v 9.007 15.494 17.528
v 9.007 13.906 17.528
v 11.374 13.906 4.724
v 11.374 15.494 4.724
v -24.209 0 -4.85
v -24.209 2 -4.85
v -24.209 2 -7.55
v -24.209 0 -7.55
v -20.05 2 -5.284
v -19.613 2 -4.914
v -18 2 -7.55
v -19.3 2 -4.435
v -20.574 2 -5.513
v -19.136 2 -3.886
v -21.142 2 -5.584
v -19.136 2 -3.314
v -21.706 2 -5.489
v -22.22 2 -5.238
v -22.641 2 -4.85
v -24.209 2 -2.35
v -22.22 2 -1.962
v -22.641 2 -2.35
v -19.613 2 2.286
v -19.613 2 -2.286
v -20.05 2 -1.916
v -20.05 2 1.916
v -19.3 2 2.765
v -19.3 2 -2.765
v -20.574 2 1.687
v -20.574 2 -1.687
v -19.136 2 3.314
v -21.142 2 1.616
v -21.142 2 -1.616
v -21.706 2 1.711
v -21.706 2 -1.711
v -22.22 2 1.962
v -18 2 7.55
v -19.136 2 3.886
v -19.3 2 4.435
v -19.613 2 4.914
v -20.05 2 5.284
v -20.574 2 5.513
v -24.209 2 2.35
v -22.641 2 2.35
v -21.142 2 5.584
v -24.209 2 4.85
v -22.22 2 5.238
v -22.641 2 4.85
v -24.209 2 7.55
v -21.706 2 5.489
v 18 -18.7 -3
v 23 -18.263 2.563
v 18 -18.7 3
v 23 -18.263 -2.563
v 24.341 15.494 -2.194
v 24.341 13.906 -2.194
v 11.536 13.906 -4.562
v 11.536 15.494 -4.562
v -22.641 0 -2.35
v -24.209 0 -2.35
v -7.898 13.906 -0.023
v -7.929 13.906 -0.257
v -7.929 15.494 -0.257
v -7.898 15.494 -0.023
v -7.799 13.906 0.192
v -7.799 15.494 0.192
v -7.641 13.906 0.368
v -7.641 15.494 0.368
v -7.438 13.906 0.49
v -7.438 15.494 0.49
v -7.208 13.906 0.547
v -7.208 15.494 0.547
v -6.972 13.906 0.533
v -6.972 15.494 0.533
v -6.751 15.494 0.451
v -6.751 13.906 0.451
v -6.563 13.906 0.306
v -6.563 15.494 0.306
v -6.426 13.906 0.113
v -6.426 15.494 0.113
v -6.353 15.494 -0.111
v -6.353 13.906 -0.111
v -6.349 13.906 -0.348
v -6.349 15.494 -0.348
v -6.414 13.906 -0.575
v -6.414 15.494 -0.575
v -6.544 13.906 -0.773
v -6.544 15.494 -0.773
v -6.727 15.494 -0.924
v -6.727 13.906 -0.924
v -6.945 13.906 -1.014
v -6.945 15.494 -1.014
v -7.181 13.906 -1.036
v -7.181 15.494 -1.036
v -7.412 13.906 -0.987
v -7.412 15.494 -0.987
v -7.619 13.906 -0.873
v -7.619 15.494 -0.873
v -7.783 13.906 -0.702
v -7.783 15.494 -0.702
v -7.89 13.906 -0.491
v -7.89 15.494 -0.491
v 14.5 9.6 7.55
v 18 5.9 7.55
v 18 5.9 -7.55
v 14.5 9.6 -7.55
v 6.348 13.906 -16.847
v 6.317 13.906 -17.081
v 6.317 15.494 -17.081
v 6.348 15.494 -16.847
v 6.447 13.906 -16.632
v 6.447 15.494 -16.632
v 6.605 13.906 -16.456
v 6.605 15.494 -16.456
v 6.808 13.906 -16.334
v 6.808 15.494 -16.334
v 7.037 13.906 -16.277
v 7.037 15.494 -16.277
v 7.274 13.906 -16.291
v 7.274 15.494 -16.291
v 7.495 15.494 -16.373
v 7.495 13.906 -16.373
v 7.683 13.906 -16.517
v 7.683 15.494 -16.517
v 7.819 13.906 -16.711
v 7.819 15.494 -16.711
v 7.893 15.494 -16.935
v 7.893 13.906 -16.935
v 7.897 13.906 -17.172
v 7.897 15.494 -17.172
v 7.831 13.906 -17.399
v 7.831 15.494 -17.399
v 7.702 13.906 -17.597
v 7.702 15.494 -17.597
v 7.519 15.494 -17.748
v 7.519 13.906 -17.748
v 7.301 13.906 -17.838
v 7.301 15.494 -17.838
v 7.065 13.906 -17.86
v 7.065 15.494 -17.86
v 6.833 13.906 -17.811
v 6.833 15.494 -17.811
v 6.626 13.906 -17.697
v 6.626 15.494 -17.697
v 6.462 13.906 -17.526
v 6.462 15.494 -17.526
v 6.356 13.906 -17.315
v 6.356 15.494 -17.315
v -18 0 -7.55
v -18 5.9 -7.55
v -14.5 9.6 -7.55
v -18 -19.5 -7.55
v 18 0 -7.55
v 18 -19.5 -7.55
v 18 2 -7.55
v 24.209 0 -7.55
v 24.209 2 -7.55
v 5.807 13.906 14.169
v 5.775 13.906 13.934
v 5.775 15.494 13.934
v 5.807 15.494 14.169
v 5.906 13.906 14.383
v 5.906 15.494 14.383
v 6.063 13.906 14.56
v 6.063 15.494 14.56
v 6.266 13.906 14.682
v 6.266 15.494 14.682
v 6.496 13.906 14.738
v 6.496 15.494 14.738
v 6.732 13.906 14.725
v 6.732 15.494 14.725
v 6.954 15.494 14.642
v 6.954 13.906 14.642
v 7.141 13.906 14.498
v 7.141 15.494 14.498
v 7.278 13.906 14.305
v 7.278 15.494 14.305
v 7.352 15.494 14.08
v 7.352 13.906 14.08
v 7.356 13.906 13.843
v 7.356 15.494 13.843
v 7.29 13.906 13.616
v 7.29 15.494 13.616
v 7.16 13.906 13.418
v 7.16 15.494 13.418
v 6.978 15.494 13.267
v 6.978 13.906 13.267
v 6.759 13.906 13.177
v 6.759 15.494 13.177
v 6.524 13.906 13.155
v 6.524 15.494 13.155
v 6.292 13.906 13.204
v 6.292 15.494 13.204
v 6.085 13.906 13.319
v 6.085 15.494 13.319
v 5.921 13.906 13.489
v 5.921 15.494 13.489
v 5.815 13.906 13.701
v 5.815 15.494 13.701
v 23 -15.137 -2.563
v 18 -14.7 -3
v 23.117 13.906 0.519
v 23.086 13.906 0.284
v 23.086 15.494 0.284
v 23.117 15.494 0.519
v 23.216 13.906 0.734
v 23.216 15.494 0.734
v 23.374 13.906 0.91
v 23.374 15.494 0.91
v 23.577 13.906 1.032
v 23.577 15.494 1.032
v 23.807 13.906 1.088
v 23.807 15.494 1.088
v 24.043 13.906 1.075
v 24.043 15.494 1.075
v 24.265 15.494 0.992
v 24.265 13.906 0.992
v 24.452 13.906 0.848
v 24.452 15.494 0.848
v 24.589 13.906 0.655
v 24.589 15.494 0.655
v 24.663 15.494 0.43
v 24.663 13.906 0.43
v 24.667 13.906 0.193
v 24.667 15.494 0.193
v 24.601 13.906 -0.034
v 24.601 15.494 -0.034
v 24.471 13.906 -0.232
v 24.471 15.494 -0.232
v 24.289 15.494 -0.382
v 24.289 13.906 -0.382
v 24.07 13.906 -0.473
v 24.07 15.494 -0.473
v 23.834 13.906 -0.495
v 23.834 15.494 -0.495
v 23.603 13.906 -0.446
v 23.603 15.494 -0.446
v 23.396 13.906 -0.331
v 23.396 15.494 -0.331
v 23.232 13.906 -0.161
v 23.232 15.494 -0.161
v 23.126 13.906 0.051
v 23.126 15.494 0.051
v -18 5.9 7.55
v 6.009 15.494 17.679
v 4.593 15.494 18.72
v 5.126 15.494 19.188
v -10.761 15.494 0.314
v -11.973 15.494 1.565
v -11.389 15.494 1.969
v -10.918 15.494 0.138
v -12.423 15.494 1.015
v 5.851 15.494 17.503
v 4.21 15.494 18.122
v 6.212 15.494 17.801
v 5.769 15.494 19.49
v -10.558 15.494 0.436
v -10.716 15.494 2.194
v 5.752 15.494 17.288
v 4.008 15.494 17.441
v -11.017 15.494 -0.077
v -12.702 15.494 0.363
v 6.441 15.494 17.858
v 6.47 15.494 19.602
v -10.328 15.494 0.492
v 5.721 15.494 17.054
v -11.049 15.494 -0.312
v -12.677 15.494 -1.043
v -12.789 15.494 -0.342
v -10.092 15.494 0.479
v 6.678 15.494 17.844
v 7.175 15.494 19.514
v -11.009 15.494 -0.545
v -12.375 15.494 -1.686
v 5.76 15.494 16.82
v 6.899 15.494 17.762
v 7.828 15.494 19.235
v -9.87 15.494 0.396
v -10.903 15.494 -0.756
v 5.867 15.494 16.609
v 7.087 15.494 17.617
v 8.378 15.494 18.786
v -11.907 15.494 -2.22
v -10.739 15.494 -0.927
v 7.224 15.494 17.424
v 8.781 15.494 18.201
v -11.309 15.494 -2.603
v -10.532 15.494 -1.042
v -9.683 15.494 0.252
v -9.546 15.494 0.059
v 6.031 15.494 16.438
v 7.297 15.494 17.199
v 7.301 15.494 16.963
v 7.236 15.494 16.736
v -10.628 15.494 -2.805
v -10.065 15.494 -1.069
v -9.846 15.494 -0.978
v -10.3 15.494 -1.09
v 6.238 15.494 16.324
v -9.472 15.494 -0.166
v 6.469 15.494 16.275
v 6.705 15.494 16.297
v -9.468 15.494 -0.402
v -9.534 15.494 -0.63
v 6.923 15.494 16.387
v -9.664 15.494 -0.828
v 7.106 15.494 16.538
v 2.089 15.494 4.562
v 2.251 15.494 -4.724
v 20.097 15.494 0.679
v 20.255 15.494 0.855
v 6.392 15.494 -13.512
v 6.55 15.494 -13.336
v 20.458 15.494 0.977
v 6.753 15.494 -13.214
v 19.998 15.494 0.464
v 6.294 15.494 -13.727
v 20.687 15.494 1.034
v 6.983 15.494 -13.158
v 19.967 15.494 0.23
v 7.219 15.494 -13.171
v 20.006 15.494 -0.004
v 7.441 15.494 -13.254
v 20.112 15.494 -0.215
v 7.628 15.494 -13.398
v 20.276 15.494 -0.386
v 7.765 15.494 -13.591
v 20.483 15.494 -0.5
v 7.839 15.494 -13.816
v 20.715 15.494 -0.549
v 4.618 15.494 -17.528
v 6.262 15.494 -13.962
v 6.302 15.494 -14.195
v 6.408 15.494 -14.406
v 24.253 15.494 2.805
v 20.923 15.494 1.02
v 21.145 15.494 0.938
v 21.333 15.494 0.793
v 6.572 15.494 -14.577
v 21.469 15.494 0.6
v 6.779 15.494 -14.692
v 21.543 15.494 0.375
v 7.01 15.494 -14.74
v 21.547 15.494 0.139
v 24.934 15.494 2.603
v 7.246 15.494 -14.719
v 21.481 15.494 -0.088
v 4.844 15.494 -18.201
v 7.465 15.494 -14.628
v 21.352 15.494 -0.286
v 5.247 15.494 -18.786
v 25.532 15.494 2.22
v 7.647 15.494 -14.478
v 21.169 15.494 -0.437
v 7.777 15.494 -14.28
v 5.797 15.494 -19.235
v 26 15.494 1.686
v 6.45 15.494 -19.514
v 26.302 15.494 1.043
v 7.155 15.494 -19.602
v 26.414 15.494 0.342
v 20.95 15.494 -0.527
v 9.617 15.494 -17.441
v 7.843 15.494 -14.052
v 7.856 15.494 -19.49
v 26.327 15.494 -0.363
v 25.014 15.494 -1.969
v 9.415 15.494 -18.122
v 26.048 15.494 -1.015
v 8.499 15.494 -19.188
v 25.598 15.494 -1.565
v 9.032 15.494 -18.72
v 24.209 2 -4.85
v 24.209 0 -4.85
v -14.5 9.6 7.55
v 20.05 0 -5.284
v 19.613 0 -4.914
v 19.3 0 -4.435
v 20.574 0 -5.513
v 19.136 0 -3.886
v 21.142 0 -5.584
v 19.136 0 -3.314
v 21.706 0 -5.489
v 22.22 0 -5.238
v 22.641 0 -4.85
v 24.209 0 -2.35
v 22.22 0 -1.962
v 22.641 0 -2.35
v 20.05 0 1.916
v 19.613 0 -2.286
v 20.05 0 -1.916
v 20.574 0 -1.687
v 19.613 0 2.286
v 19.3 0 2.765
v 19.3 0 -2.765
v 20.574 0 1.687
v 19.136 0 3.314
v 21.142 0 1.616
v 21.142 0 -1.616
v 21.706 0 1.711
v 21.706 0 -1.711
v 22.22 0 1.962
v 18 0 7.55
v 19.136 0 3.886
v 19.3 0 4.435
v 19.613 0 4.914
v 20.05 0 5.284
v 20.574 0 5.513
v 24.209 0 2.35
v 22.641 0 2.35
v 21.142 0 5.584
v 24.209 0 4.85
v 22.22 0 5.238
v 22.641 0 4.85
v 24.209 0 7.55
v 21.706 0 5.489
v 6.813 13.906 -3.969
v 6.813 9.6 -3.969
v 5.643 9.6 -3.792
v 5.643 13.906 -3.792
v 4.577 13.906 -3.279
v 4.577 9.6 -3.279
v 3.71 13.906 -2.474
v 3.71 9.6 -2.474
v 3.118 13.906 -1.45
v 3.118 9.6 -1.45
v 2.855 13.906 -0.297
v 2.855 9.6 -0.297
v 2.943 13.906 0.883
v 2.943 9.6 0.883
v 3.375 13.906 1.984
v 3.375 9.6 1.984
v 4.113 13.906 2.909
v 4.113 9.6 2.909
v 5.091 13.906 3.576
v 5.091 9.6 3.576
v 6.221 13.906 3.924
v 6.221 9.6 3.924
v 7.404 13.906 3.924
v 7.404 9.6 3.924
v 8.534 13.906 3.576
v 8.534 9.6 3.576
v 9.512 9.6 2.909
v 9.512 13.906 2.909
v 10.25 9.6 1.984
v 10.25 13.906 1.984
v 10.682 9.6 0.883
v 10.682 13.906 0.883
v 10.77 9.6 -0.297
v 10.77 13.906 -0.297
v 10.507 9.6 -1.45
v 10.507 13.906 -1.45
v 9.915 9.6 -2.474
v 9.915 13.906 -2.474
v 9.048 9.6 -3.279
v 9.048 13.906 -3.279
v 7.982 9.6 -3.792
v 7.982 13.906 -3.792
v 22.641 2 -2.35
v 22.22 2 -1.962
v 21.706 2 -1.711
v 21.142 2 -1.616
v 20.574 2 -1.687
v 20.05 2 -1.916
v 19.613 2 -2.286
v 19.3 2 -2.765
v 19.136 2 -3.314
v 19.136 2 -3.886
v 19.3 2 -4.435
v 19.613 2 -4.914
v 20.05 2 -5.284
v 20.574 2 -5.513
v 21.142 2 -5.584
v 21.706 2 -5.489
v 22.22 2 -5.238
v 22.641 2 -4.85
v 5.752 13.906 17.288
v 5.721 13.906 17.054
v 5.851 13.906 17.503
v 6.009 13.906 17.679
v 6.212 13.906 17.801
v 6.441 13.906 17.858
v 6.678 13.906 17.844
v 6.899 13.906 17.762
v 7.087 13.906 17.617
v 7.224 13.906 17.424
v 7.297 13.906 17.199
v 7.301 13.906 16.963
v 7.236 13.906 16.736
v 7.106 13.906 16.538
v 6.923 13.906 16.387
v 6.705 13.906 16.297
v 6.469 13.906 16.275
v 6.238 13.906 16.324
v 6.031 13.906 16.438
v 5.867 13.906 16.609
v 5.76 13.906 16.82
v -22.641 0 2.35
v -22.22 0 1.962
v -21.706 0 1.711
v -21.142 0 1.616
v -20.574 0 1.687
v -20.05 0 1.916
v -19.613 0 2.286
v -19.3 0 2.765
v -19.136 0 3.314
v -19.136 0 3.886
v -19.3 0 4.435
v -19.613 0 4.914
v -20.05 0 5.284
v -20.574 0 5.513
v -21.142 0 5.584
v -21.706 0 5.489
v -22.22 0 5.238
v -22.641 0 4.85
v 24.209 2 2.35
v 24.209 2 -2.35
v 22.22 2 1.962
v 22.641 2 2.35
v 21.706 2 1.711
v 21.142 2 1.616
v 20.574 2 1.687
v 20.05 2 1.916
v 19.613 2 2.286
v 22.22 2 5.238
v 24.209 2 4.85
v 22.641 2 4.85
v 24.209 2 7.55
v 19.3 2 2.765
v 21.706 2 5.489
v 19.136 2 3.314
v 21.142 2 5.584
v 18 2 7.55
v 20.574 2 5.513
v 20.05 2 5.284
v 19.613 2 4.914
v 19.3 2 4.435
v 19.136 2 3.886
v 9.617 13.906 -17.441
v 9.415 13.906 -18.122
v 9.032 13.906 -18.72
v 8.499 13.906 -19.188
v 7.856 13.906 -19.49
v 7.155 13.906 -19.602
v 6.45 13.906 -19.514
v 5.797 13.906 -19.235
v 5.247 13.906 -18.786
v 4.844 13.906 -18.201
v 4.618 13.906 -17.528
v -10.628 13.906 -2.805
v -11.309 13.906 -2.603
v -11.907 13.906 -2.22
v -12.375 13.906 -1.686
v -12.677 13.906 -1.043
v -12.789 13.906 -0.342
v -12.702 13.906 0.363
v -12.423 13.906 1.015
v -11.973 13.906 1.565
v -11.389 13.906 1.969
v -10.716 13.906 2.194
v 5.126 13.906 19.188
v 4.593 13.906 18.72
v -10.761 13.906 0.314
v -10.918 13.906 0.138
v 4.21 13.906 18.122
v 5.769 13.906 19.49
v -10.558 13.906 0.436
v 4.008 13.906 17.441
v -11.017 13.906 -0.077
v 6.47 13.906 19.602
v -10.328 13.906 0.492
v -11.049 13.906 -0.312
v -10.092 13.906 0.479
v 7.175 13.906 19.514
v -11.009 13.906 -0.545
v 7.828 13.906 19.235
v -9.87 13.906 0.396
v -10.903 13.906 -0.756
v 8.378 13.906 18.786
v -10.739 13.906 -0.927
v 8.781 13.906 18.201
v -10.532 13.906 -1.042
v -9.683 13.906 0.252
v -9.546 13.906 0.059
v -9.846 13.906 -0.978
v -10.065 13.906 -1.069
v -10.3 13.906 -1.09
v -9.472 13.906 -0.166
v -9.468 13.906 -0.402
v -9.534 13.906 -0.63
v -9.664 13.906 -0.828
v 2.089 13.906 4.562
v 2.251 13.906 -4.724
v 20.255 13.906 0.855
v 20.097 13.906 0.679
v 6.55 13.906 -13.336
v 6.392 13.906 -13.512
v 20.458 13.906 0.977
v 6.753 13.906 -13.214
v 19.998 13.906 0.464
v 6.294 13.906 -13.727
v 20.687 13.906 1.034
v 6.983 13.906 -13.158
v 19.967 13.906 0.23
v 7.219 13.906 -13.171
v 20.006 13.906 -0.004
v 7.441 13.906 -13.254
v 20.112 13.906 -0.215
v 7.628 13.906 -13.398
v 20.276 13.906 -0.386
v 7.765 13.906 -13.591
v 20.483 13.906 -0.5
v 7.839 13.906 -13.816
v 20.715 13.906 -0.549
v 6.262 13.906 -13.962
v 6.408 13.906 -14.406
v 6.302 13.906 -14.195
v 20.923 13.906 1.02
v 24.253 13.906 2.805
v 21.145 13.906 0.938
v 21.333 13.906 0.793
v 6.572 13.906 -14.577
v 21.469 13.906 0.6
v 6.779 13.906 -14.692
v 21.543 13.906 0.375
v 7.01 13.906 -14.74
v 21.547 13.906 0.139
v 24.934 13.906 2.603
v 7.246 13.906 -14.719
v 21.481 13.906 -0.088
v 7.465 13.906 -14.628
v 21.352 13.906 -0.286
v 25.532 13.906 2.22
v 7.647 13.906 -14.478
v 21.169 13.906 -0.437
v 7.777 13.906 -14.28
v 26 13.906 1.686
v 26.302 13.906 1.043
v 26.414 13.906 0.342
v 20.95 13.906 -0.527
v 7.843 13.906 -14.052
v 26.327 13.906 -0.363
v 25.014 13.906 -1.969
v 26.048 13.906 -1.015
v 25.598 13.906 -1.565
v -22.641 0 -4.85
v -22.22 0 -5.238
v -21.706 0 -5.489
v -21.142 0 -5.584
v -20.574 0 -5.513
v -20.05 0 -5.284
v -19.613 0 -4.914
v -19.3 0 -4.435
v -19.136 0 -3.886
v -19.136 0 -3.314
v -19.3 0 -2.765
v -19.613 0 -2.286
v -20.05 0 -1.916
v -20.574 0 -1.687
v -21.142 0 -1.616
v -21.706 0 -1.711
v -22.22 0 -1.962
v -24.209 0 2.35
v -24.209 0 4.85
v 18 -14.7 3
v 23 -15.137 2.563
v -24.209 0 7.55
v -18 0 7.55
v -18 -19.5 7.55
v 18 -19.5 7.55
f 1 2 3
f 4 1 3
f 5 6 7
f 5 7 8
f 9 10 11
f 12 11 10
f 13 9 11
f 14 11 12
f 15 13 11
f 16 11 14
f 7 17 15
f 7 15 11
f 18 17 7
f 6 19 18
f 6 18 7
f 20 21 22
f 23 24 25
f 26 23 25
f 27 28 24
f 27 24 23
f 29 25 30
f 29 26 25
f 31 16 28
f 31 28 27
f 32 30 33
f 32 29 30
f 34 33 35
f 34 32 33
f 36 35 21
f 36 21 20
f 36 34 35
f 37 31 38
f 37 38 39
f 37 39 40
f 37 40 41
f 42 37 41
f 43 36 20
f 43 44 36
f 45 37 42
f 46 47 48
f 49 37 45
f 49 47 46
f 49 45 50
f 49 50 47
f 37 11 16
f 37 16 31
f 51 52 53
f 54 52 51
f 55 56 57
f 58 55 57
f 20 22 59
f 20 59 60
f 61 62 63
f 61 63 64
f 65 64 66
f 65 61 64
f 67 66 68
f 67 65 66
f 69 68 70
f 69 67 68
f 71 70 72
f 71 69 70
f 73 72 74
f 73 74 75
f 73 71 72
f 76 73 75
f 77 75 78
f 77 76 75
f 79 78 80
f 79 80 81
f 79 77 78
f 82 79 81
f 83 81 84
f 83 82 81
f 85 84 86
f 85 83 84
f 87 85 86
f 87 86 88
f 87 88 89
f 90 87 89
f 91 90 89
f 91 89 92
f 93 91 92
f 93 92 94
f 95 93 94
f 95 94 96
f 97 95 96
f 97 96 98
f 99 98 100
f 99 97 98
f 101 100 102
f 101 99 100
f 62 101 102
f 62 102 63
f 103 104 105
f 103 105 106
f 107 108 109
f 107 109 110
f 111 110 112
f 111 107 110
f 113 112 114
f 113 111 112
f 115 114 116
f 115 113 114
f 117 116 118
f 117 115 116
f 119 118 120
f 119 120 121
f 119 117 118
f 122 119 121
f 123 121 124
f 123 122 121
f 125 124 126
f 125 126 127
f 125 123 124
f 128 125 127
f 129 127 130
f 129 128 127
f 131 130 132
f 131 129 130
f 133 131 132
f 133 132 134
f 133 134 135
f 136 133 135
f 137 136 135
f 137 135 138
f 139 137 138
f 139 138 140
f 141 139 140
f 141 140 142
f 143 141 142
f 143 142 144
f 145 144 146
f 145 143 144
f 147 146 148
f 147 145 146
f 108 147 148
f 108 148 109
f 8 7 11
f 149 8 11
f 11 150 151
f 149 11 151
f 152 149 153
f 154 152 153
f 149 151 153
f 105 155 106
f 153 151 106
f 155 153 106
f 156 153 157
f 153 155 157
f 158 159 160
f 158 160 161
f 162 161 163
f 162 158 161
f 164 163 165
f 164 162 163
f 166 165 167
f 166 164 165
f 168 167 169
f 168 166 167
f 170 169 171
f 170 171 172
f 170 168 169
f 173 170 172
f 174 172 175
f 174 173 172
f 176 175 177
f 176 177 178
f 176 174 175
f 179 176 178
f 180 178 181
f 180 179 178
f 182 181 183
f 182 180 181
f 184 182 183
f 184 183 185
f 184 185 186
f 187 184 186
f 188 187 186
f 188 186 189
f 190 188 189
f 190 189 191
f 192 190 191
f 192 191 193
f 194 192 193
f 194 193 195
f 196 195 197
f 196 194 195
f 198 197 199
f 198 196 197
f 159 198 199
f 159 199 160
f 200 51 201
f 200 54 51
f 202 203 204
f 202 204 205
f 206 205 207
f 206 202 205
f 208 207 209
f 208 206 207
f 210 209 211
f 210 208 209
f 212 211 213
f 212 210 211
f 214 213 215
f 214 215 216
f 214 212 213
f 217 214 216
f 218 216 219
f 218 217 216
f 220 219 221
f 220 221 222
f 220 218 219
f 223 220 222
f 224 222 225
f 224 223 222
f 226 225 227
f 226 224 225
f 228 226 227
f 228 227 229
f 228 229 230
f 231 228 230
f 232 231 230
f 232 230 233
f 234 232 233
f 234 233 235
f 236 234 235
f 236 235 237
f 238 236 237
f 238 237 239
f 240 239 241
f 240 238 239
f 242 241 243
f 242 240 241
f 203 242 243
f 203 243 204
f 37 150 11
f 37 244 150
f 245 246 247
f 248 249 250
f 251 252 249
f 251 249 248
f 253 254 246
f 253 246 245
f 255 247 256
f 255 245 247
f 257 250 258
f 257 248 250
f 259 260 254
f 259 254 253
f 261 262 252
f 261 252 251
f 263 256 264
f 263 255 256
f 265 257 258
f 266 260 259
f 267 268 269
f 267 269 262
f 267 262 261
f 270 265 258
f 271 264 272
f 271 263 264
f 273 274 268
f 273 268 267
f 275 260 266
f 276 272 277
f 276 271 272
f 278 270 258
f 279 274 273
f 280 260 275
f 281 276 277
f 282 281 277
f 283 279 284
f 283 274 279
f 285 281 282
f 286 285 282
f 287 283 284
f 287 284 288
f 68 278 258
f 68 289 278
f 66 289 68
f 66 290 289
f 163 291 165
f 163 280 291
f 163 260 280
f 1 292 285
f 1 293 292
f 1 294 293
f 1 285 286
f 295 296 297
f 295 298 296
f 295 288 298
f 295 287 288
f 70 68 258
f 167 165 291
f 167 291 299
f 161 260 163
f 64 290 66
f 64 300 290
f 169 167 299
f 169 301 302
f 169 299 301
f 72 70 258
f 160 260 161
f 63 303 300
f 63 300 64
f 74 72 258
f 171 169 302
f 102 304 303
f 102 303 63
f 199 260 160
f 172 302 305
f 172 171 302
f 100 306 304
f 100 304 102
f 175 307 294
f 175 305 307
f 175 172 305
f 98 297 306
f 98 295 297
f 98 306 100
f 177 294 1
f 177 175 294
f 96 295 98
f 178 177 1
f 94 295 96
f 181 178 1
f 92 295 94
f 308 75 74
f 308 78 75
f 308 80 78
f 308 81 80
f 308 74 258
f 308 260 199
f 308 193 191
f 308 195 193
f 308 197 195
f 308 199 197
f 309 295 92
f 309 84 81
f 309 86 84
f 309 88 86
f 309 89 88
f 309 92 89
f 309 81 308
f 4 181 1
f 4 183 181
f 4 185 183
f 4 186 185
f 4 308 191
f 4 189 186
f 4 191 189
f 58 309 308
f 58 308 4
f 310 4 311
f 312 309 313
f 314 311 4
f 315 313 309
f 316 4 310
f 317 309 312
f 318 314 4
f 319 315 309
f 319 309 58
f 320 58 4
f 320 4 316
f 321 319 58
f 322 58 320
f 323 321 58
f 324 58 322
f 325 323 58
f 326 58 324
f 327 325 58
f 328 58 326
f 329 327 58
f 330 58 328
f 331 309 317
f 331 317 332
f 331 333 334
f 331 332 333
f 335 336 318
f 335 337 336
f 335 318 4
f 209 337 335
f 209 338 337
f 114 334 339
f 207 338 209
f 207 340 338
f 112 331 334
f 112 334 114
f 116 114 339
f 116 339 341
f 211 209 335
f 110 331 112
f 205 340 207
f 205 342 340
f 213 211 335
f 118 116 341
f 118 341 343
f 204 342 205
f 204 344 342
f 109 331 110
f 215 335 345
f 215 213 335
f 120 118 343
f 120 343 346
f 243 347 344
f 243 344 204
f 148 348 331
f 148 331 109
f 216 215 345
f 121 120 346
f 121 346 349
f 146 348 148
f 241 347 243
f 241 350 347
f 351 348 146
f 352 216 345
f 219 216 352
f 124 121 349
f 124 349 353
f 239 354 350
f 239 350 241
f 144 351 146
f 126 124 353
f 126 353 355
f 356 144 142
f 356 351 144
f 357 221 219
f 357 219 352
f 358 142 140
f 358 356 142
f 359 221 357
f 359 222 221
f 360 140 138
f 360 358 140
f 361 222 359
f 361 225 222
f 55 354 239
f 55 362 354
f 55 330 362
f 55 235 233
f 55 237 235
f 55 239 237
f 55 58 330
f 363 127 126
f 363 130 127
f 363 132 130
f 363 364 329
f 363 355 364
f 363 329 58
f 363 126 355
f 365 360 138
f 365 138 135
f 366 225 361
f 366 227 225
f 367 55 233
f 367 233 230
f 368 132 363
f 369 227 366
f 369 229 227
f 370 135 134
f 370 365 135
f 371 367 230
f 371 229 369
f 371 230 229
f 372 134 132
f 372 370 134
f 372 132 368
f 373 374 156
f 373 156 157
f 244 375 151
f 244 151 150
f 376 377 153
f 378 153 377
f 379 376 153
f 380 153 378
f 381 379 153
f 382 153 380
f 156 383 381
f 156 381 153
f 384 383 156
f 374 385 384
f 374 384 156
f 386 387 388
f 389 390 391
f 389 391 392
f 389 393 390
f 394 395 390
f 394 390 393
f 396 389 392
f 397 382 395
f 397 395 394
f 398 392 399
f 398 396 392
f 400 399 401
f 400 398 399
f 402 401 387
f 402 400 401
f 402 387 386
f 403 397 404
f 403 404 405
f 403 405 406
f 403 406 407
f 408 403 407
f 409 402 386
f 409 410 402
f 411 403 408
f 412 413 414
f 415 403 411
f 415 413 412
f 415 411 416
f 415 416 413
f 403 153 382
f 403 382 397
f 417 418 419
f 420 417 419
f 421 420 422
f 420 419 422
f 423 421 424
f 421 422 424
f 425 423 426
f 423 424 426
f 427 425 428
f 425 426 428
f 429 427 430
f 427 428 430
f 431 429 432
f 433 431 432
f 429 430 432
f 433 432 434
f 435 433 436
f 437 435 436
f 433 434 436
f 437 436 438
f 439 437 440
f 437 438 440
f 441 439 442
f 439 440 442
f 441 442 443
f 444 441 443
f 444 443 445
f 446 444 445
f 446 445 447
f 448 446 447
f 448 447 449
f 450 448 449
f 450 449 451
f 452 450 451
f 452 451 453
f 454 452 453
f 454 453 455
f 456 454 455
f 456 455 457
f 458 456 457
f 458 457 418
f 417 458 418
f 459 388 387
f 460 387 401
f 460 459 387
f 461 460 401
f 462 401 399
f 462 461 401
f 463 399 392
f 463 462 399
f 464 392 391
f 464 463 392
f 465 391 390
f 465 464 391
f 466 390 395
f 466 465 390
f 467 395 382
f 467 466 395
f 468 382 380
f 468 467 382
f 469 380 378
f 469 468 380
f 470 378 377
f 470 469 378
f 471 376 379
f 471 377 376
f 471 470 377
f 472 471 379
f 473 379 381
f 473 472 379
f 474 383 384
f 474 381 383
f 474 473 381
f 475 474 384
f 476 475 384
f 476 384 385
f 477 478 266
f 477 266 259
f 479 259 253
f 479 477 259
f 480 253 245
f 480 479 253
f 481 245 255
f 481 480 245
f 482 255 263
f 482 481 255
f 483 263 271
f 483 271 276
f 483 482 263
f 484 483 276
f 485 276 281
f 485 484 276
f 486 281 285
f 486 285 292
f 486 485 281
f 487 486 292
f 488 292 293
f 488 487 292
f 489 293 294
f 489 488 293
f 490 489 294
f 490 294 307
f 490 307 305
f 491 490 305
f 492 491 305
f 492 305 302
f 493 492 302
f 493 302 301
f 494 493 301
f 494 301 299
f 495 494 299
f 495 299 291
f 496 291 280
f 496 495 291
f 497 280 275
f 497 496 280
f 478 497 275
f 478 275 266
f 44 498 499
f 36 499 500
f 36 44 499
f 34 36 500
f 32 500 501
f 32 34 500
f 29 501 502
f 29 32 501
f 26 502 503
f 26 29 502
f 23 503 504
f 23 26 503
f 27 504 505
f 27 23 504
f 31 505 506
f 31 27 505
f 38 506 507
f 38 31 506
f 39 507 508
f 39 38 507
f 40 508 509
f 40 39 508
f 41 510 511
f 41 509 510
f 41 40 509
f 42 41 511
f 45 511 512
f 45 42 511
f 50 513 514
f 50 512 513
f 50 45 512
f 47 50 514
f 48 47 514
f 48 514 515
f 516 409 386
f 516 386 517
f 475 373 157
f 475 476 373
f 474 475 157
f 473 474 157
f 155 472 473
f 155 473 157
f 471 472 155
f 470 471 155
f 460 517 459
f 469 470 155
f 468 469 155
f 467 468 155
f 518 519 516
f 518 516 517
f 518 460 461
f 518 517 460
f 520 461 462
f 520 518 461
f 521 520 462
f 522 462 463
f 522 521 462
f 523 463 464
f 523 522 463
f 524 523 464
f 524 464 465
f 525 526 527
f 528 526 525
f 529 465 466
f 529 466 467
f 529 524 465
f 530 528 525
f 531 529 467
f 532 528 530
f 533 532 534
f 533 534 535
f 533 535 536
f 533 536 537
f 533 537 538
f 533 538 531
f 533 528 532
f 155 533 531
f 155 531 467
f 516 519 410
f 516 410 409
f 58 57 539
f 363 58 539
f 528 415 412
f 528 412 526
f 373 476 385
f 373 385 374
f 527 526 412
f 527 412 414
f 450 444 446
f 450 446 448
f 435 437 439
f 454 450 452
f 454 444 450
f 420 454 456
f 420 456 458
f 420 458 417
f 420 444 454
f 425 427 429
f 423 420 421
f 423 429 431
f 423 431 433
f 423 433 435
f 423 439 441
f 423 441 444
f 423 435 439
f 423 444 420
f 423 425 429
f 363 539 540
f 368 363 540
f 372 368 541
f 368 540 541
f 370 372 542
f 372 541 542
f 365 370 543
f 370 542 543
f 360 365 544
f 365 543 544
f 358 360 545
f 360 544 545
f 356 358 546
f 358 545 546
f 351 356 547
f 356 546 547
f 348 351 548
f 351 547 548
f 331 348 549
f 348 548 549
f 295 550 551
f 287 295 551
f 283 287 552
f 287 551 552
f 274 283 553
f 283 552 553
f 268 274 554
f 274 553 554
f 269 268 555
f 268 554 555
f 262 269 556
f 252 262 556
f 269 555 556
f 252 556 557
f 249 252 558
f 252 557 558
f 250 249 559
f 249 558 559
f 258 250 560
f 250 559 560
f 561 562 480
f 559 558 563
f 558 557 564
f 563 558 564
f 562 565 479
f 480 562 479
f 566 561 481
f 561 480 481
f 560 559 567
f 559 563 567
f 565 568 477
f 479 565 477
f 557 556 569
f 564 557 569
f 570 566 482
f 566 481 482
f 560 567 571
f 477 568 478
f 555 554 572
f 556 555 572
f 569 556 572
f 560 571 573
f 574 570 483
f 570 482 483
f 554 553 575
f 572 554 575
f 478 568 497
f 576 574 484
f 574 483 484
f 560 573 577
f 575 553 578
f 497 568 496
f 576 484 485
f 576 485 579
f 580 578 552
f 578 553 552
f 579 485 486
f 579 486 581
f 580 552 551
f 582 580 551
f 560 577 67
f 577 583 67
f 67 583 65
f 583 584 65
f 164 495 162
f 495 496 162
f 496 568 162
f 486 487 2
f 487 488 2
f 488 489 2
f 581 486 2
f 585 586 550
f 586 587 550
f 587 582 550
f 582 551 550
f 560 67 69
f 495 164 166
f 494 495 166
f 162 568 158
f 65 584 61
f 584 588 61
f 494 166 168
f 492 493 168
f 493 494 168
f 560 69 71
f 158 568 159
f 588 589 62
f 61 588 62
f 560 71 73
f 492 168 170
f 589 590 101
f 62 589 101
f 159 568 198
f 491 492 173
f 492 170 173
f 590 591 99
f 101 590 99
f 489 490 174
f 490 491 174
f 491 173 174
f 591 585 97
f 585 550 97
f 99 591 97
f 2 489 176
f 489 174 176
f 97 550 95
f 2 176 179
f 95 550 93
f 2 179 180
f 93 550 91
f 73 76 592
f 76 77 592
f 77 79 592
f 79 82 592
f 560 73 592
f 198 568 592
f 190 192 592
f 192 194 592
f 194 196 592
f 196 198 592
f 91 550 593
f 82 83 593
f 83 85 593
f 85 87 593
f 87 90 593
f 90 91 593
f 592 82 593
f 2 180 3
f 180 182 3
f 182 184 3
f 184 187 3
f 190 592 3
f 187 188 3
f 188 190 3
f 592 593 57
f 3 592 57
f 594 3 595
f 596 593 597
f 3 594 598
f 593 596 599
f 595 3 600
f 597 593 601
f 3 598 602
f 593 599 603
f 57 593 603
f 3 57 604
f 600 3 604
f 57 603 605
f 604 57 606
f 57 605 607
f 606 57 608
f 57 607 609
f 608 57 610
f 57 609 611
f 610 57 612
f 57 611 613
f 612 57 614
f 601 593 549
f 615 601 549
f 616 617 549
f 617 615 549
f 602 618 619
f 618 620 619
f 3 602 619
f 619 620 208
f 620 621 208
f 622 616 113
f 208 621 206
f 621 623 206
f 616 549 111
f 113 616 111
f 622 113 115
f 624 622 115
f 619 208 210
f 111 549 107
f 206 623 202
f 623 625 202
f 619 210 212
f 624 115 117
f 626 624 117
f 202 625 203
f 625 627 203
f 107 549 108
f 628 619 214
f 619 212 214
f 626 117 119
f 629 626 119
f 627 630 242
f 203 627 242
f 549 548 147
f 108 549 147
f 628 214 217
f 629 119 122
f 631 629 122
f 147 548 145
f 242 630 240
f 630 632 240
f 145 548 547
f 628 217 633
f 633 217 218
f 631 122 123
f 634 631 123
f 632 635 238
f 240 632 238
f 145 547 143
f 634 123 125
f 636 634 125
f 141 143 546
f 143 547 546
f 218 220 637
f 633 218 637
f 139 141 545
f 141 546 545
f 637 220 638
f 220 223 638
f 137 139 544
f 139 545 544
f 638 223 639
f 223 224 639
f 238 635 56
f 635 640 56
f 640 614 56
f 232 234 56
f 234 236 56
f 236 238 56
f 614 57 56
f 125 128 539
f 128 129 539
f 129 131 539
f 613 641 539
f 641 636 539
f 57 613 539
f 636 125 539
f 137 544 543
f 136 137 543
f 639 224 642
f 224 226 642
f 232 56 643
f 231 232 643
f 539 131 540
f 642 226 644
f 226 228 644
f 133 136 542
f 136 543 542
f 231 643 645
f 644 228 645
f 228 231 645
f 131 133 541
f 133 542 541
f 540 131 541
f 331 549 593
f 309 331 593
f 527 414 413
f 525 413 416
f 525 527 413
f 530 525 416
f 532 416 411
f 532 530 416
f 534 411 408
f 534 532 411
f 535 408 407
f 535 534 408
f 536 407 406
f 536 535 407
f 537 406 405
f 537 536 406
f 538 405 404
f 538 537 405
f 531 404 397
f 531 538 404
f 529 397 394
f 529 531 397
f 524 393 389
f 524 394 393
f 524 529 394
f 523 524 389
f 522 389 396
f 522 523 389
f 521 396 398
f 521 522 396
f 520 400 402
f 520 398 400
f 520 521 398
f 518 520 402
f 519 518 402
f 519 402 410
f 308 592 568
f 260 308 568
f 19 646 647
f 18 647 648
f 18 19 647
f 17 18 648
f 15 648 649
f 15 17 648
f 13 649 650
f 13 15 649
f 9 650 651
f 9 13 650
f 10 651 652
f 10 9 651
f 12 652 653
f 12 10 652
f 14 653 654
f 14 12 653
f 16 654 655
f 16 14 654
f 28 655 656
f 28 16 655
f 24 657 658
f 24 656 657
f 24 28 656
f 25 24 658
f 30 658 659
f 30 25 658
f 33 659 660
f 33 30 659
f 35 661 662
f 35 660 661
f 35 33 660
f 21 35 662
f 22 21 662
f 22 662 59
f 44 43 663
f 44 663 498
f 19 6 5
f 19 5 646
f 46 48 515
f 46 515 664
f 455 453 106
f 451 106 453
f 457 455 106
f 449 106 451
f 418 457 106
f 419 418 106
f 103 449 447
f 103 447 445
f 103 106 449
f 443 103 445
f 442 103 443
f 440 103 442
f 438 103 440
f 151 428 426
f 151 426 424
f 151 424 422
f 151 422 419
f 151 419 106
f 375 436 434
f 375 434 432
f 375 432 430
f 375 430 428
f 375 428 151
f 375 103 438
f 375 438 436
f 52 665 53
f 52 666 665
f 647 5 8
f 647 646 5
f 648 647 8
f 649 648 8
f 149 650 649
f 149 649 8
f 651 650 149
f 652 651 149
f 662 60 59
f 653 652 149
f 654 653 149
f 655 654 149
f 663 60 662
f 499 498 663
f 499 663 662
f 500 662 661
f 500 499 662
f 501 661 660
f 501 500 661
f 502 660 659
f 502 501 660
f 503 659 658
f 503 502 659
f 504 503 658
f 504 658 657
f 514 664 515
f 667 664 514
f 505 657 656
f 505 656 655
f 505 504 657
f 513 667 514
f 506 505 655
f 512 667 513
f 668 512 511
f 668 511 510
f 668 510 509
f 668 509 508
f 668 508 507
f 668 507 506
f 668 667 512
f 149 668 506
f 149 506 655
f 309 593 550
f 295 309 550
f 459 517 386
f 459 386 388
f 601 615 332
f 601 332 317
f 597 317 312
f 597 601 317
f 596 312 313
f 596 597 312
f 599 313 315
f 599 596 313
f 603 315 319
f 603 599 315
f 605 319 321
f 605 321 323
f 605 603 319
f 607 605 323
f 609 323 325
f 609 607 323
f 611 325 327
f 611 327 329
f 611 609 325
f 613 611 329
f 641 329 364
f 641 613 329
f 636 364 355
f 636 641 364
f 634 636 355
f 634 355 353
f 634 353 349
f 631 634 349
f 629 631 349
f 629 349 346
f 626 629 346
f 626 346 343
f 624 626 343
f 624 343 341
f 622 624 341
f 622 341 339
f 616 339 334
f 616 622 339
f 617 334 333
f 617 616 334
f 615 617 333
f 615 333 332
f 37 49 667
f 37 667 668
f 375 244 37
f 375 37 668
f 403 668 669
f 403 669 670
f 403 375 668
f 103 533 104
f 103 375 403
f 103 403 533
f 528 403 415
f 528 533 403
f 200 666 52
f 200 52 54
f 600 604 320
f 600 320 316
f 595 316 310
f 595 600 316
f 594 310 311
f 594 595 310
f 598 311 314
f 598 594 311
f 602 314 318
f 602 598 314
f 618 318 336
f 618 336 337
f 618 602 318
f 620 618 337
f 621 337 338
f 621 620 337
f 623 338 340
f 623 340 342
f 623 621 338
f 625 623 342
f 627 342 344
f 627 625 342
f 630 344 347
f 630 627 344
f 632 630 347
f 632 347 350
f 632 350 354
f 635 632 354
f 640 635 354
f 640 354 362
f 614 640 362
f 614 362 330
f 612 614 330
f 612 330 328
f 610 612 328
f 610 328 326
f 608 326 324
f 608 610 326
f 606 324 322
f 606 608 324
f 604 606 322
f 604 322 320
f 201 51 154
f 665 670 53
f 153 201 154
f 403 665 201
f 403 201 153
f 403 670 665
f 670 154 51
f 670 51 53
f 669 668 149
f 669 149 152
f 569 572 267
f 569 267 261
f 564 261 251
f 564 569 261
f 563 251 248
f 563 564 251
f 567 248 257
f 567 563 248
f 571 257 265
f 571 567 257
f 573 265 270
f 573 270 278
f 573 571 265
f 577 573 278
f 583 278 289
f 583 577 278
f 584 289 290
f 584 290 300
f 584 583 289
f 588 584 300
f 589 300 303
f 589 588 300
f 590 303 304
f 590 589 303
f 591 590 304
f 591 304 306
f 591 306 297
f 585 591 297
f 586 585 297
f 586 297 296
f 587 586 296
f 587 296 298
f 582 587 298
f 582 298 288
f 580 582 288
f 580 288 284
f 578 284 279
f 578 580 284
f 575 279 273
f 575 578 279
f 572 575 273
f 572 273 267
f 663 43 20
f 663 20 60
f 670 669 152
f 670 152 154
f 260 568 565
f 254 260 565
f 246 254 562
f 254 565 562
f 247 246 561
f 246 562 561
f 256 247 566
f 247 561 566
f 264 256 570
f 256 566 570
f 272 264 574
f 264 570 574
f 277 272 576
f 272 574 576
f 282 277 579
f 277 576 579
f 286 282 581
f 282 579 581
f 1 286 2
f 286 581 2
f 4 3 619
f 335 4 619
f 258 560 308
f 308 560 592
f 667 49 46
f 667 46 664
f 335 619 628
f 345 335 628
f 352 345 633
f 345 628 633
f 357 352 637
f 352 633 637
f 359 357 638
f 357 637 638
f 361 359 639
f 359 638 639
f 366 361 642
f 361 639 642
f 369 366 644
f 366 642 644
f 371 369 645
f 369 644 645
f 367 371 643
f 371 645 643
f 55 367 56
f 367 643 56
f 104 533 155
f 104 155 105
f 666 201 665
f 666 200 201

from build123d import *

# Parameters (mm, degrees)
BOSS_EXTRUDE1_DEPTH   = 7.55
CUT_EXTRUDE1_REACH    = 35.247
SKETCH3_R             = 3.96875
BOSS_EXTRUDE2_DEPTH   = 11.90625
SKETCH4_R             = 0.79375
BOSS_EXTRUDE3_DEPTH   = 1.5875
SKETCH5_W             = 6
SKETCH5_H             = 4
BOSS_EXTRUDE4_DEPTH   = 5
BOSS_EXTRUDE4_TAPER   = 5
BODY_MOVE_COPY1_ANGLE = 1


with BuildPart() as part:
    # Sketch1 → Boss-Extrude1 (new, symmetric)
    with BuildSketch(Plane.XY):
        Polygon((-24.209375, 2), (-24.209375, 0), (-18, 0), (-18, -19.5), (18, -19.5), (18, 0), (24.209375, 0), (24.209375, 2), (18, 2), (18, 5.9), (14.5, 9.6), (-14.5, 9.6), (-18, 5.9), (-18, 2), align=None)
    extrude(amount=BOSS_EXTRUDE1_DEPTH, both=True)

    # Sketch2 → Cut-Extrude1 (cut, up to next)
    with BuildSketch(Plane(origin=(0, 2, 0), x_dir=(1, 0, 0), z_dir=(0, 1, 0)), mode=Mode.PRIVATE) as cut_extrude1_sk1:
        with BuildLine():
            Line((-24.209375, -2.35), (-22.641182708, -2.35))
            ThreePointArc((-22.641182708, -2.35), (-19.115625, -3.6), (-22.641182708, -4.85))
            Line((-22.641182708, -4.85), (-24.209375, -4.85))
            Line((-24.209375, -4.85), (-24.209375, -2.35))
        make_face()
    cut_extrude1_tool1 = extrude(cut_extrude1_sk1.sketch, amount=-CUT_EXTRUDE1_REACH, mode=Mode.PRIVATE) & part.part
    # Sketch2 → Cut-Extrude1 (cut, up to next)
    with BuildSketch(Plane(origin=(0, 2, 0), x_dir=(1, 0, 0), z_dir=(0, 1, 0)), mode=Mode.PRIVATE) as cut_extrude1_sk2:
        with BuildLine():
            Line((24.209375, -2.35), (24.209375, -4.85))
            Line((24.209375, -4.85), (22.641182708, -4.85))
            ThreePointArc((22.641182708, -4.85), (19.115625, -3.6), (22.641182708, -2.35))
            Line((22.641182708, -2.35), (24.209375, -2.35))
        make_face()
    cut_extrude1_tool2 = extrude(cut_extrude1_sk2.sketch, amount=-CUT_EXTRUDE1_REACH, mode=Mode.PRIVATE) & part.part
    # Sketch2 → Cut-Extrude1 (cut, up to next)
    with BuildSketch(Plane(origin=(0, 2, 0), x_dir=(1, 0, 0), z_dir=(0, 1, 0)), mode=Mode.PRIVATE) as cut_extrude1_sk3:
        with BuildLine():
            Line((24.209375, 2.35), (22.641182708, 2.35))
            ThreePointArc((22.641182708, 2.35), (19.115625, 3.6), (22.641182708, 4.85))
            Line((22.641182708, 4.85), (24.209375, 4.85))
            Line((24.209375, 4.85), (24.209375, 2.35))
        make_face()
    cut_extrude1_tool3 = extrude(cut_extrude1_sk3.sketch, amount=-CUT_EXTRUDE1_REACH, mode=Mode.PRIVATE) & part.part
    # Sketch2 → Cut-Extrude1 (cut, up to next)
    with BuildSketch(Plane(origin=(0, 2, 0), x_dir=(1, 0, 0), z_dir=(0, 1, 0)), mode=Mode.PRIVATE) as cut_extrude1_sk4:
        with BuildLine():
            Line((-24.209375, 2.35), (-24.209375, 4.85))
            Line((-24.209375, 4.85), (-22.641182708, 4.85))
            ThreePointArc((-22.641182708, 4.85), (-19.115625, 3.6), (-22.641182708, 2.35))
            Line((-22.641182708, 2.35), (-24.209375, 2.35))
        make_face()
    cut_extrude1_tool4 = extrude(cut_extrude1_sk4.sketch, amount=-CUT_EXTRUDE1_REACH, mode=Mode.PRIVATE) & part.part
    add(cut_extrude1_tool1.solids().sort_by_distance((-21.603022, 2, 3.6))[0], mode=Mode.SUBTRACT)
    add(cut_extrude1_tool2.solids().sort_by_distance((21.603022, 2, 3.6))[0], mode=Mode.SUBTRACT)
    add(cut_extrude1_tool3.solids().sort_by_distance((21.603022, 2, -3.6))[0], mode=Mode.SUBTRACT)
    add(cut_extrude1_tool4.solids().sort_by_distance((-21.603022, 2, -3.6))[0], mode=Mode.SUBTRACT)

    # Sketch3 → Boss-Extrude2 (add)
    with BuildSketch(Plane(origin=(0, 2, 0), x_dir=(1, 0, 0), z_dir=(0, 1, 0))):
        with Locations(Location((6.8125, 0, 0), (0, 0, 90))):
            Circle(SKETCH3_R)
    extrude(amount=BOSS_EXTRUDE2_DEPTH)

    # Sketch5 → Boss-Extrude4 (add)
    with BuildSketch(Plane(origin=(18, 0, 0), x_dir=(0, 0, -1), z_dir=(1, 0, 0))):
        with Locations((0, -16.7)):
            Rectangle(SKETCH5_W, SKETCH5_H)
    extrude(amount=BOSS_EXTRUDE4_DEPTH, taper=BOSS_EXTRUDE4_TAPER)


with BuildPart() as body_2:
    # Sketch4 → Boss-Extrude3 (new body)
    with BuildSketch(Plane(origin=(0, 13.90625, 0), x_dir=(1, 0, 0), z_dir=(0, 1, 0))):
        with BuildLine():
            Line((2.169231166, 4.643268834), (-10.674676171, 2.5))
            ThreePointArc((-10.674676171, 2.5), (-12.792068199, 0), (-10.674676171, -2.5))
            Line((-10.674676171, -2.5), (2.169231166, -4.643268834))
            Line((2.169231166, -4.643268834), (4.3125, -17.487176171))
            ThreePointArc((4.3125, -17.487176171), (6.8125, -19.604568199), (9.3125, -17.487176171))
            Line((9.3125, -17.487176171), (11.455768834, -4.643268834))
            Line((11.455768834, -4.643268834), (24.299676171, -2.5))
            ThreePointArc((24.299676171, -2.5), (26.417068199, 0), (24.299676171, 2.5))
            Line((24.299676171, 2.5), (11.455768834, 4.643268834))
            Line((11.455768834, 4.643268834), (9.3125, 17.487176171))
            ThreePointArc((9.3125, 17.487176171), (6.8125, 19.604568199), (4.3125, 17.487176171))
            Line((4.3125, 17.487176171), (2.169231166, 4.643268834))
        make_face()
        with Locations(Location((-10.2575, 0, 0), (0, 0, 180))):
            Circle(SKETCH4_R, mode=Mode.SUBTRACT)
        with Locations(Location((6.8125, 17.07, 0), (0, 0, 180))):
            Circle(SKETCH4_R, mode=Mode.SUBTRACT)
        with Locations(Location((23.8825, 0, 0), (0, 0, 180))):
            Circle(SKETCH4_R, mode=Mode.SUBTRACT)
        with Locations(Location((6.8125, -17.07, 0), (0, 0, 180))):
            Circle(SKETCH4_R, mode=Mode.SUBTRACT)
        with Locations(Location((-7.1375, 0, 0), (0, 0, 180))):
            Circle(SKETCH4_R, mode=Mode.SUBTRACT)
        with Locations(Location((6.8125, 13.95, 0), (0, 0, 180))):
            Circle(SKETCH4_R, mode=Mode.SUBTRACT)
        with Locations(Location((20.7625, 0, 0), (0, 0, 180))):
            Circle(SKETCH4_R, mode=Mode.SUBTRACT)
        with Locations(Location((6.8125, -13.95, 0), (0, 0, 180))):
            Circle(SKETCH4_R, mode=Mode.SUBTRACT)
    extrude(amount=BOSS_EXTRUDE3_DEPTH)


with BuildPart() as body_2_1:
    # Body-Move/Copy1: moved
    add(body_2.part.moved(Location((0, 0, 0))).rotate(Axis((6.8125, 0, 0), (0, -1, 0)), BODY_MOVE_COPY1_ANGLE))


solid = Compound([part.part, body_2_1.part])
